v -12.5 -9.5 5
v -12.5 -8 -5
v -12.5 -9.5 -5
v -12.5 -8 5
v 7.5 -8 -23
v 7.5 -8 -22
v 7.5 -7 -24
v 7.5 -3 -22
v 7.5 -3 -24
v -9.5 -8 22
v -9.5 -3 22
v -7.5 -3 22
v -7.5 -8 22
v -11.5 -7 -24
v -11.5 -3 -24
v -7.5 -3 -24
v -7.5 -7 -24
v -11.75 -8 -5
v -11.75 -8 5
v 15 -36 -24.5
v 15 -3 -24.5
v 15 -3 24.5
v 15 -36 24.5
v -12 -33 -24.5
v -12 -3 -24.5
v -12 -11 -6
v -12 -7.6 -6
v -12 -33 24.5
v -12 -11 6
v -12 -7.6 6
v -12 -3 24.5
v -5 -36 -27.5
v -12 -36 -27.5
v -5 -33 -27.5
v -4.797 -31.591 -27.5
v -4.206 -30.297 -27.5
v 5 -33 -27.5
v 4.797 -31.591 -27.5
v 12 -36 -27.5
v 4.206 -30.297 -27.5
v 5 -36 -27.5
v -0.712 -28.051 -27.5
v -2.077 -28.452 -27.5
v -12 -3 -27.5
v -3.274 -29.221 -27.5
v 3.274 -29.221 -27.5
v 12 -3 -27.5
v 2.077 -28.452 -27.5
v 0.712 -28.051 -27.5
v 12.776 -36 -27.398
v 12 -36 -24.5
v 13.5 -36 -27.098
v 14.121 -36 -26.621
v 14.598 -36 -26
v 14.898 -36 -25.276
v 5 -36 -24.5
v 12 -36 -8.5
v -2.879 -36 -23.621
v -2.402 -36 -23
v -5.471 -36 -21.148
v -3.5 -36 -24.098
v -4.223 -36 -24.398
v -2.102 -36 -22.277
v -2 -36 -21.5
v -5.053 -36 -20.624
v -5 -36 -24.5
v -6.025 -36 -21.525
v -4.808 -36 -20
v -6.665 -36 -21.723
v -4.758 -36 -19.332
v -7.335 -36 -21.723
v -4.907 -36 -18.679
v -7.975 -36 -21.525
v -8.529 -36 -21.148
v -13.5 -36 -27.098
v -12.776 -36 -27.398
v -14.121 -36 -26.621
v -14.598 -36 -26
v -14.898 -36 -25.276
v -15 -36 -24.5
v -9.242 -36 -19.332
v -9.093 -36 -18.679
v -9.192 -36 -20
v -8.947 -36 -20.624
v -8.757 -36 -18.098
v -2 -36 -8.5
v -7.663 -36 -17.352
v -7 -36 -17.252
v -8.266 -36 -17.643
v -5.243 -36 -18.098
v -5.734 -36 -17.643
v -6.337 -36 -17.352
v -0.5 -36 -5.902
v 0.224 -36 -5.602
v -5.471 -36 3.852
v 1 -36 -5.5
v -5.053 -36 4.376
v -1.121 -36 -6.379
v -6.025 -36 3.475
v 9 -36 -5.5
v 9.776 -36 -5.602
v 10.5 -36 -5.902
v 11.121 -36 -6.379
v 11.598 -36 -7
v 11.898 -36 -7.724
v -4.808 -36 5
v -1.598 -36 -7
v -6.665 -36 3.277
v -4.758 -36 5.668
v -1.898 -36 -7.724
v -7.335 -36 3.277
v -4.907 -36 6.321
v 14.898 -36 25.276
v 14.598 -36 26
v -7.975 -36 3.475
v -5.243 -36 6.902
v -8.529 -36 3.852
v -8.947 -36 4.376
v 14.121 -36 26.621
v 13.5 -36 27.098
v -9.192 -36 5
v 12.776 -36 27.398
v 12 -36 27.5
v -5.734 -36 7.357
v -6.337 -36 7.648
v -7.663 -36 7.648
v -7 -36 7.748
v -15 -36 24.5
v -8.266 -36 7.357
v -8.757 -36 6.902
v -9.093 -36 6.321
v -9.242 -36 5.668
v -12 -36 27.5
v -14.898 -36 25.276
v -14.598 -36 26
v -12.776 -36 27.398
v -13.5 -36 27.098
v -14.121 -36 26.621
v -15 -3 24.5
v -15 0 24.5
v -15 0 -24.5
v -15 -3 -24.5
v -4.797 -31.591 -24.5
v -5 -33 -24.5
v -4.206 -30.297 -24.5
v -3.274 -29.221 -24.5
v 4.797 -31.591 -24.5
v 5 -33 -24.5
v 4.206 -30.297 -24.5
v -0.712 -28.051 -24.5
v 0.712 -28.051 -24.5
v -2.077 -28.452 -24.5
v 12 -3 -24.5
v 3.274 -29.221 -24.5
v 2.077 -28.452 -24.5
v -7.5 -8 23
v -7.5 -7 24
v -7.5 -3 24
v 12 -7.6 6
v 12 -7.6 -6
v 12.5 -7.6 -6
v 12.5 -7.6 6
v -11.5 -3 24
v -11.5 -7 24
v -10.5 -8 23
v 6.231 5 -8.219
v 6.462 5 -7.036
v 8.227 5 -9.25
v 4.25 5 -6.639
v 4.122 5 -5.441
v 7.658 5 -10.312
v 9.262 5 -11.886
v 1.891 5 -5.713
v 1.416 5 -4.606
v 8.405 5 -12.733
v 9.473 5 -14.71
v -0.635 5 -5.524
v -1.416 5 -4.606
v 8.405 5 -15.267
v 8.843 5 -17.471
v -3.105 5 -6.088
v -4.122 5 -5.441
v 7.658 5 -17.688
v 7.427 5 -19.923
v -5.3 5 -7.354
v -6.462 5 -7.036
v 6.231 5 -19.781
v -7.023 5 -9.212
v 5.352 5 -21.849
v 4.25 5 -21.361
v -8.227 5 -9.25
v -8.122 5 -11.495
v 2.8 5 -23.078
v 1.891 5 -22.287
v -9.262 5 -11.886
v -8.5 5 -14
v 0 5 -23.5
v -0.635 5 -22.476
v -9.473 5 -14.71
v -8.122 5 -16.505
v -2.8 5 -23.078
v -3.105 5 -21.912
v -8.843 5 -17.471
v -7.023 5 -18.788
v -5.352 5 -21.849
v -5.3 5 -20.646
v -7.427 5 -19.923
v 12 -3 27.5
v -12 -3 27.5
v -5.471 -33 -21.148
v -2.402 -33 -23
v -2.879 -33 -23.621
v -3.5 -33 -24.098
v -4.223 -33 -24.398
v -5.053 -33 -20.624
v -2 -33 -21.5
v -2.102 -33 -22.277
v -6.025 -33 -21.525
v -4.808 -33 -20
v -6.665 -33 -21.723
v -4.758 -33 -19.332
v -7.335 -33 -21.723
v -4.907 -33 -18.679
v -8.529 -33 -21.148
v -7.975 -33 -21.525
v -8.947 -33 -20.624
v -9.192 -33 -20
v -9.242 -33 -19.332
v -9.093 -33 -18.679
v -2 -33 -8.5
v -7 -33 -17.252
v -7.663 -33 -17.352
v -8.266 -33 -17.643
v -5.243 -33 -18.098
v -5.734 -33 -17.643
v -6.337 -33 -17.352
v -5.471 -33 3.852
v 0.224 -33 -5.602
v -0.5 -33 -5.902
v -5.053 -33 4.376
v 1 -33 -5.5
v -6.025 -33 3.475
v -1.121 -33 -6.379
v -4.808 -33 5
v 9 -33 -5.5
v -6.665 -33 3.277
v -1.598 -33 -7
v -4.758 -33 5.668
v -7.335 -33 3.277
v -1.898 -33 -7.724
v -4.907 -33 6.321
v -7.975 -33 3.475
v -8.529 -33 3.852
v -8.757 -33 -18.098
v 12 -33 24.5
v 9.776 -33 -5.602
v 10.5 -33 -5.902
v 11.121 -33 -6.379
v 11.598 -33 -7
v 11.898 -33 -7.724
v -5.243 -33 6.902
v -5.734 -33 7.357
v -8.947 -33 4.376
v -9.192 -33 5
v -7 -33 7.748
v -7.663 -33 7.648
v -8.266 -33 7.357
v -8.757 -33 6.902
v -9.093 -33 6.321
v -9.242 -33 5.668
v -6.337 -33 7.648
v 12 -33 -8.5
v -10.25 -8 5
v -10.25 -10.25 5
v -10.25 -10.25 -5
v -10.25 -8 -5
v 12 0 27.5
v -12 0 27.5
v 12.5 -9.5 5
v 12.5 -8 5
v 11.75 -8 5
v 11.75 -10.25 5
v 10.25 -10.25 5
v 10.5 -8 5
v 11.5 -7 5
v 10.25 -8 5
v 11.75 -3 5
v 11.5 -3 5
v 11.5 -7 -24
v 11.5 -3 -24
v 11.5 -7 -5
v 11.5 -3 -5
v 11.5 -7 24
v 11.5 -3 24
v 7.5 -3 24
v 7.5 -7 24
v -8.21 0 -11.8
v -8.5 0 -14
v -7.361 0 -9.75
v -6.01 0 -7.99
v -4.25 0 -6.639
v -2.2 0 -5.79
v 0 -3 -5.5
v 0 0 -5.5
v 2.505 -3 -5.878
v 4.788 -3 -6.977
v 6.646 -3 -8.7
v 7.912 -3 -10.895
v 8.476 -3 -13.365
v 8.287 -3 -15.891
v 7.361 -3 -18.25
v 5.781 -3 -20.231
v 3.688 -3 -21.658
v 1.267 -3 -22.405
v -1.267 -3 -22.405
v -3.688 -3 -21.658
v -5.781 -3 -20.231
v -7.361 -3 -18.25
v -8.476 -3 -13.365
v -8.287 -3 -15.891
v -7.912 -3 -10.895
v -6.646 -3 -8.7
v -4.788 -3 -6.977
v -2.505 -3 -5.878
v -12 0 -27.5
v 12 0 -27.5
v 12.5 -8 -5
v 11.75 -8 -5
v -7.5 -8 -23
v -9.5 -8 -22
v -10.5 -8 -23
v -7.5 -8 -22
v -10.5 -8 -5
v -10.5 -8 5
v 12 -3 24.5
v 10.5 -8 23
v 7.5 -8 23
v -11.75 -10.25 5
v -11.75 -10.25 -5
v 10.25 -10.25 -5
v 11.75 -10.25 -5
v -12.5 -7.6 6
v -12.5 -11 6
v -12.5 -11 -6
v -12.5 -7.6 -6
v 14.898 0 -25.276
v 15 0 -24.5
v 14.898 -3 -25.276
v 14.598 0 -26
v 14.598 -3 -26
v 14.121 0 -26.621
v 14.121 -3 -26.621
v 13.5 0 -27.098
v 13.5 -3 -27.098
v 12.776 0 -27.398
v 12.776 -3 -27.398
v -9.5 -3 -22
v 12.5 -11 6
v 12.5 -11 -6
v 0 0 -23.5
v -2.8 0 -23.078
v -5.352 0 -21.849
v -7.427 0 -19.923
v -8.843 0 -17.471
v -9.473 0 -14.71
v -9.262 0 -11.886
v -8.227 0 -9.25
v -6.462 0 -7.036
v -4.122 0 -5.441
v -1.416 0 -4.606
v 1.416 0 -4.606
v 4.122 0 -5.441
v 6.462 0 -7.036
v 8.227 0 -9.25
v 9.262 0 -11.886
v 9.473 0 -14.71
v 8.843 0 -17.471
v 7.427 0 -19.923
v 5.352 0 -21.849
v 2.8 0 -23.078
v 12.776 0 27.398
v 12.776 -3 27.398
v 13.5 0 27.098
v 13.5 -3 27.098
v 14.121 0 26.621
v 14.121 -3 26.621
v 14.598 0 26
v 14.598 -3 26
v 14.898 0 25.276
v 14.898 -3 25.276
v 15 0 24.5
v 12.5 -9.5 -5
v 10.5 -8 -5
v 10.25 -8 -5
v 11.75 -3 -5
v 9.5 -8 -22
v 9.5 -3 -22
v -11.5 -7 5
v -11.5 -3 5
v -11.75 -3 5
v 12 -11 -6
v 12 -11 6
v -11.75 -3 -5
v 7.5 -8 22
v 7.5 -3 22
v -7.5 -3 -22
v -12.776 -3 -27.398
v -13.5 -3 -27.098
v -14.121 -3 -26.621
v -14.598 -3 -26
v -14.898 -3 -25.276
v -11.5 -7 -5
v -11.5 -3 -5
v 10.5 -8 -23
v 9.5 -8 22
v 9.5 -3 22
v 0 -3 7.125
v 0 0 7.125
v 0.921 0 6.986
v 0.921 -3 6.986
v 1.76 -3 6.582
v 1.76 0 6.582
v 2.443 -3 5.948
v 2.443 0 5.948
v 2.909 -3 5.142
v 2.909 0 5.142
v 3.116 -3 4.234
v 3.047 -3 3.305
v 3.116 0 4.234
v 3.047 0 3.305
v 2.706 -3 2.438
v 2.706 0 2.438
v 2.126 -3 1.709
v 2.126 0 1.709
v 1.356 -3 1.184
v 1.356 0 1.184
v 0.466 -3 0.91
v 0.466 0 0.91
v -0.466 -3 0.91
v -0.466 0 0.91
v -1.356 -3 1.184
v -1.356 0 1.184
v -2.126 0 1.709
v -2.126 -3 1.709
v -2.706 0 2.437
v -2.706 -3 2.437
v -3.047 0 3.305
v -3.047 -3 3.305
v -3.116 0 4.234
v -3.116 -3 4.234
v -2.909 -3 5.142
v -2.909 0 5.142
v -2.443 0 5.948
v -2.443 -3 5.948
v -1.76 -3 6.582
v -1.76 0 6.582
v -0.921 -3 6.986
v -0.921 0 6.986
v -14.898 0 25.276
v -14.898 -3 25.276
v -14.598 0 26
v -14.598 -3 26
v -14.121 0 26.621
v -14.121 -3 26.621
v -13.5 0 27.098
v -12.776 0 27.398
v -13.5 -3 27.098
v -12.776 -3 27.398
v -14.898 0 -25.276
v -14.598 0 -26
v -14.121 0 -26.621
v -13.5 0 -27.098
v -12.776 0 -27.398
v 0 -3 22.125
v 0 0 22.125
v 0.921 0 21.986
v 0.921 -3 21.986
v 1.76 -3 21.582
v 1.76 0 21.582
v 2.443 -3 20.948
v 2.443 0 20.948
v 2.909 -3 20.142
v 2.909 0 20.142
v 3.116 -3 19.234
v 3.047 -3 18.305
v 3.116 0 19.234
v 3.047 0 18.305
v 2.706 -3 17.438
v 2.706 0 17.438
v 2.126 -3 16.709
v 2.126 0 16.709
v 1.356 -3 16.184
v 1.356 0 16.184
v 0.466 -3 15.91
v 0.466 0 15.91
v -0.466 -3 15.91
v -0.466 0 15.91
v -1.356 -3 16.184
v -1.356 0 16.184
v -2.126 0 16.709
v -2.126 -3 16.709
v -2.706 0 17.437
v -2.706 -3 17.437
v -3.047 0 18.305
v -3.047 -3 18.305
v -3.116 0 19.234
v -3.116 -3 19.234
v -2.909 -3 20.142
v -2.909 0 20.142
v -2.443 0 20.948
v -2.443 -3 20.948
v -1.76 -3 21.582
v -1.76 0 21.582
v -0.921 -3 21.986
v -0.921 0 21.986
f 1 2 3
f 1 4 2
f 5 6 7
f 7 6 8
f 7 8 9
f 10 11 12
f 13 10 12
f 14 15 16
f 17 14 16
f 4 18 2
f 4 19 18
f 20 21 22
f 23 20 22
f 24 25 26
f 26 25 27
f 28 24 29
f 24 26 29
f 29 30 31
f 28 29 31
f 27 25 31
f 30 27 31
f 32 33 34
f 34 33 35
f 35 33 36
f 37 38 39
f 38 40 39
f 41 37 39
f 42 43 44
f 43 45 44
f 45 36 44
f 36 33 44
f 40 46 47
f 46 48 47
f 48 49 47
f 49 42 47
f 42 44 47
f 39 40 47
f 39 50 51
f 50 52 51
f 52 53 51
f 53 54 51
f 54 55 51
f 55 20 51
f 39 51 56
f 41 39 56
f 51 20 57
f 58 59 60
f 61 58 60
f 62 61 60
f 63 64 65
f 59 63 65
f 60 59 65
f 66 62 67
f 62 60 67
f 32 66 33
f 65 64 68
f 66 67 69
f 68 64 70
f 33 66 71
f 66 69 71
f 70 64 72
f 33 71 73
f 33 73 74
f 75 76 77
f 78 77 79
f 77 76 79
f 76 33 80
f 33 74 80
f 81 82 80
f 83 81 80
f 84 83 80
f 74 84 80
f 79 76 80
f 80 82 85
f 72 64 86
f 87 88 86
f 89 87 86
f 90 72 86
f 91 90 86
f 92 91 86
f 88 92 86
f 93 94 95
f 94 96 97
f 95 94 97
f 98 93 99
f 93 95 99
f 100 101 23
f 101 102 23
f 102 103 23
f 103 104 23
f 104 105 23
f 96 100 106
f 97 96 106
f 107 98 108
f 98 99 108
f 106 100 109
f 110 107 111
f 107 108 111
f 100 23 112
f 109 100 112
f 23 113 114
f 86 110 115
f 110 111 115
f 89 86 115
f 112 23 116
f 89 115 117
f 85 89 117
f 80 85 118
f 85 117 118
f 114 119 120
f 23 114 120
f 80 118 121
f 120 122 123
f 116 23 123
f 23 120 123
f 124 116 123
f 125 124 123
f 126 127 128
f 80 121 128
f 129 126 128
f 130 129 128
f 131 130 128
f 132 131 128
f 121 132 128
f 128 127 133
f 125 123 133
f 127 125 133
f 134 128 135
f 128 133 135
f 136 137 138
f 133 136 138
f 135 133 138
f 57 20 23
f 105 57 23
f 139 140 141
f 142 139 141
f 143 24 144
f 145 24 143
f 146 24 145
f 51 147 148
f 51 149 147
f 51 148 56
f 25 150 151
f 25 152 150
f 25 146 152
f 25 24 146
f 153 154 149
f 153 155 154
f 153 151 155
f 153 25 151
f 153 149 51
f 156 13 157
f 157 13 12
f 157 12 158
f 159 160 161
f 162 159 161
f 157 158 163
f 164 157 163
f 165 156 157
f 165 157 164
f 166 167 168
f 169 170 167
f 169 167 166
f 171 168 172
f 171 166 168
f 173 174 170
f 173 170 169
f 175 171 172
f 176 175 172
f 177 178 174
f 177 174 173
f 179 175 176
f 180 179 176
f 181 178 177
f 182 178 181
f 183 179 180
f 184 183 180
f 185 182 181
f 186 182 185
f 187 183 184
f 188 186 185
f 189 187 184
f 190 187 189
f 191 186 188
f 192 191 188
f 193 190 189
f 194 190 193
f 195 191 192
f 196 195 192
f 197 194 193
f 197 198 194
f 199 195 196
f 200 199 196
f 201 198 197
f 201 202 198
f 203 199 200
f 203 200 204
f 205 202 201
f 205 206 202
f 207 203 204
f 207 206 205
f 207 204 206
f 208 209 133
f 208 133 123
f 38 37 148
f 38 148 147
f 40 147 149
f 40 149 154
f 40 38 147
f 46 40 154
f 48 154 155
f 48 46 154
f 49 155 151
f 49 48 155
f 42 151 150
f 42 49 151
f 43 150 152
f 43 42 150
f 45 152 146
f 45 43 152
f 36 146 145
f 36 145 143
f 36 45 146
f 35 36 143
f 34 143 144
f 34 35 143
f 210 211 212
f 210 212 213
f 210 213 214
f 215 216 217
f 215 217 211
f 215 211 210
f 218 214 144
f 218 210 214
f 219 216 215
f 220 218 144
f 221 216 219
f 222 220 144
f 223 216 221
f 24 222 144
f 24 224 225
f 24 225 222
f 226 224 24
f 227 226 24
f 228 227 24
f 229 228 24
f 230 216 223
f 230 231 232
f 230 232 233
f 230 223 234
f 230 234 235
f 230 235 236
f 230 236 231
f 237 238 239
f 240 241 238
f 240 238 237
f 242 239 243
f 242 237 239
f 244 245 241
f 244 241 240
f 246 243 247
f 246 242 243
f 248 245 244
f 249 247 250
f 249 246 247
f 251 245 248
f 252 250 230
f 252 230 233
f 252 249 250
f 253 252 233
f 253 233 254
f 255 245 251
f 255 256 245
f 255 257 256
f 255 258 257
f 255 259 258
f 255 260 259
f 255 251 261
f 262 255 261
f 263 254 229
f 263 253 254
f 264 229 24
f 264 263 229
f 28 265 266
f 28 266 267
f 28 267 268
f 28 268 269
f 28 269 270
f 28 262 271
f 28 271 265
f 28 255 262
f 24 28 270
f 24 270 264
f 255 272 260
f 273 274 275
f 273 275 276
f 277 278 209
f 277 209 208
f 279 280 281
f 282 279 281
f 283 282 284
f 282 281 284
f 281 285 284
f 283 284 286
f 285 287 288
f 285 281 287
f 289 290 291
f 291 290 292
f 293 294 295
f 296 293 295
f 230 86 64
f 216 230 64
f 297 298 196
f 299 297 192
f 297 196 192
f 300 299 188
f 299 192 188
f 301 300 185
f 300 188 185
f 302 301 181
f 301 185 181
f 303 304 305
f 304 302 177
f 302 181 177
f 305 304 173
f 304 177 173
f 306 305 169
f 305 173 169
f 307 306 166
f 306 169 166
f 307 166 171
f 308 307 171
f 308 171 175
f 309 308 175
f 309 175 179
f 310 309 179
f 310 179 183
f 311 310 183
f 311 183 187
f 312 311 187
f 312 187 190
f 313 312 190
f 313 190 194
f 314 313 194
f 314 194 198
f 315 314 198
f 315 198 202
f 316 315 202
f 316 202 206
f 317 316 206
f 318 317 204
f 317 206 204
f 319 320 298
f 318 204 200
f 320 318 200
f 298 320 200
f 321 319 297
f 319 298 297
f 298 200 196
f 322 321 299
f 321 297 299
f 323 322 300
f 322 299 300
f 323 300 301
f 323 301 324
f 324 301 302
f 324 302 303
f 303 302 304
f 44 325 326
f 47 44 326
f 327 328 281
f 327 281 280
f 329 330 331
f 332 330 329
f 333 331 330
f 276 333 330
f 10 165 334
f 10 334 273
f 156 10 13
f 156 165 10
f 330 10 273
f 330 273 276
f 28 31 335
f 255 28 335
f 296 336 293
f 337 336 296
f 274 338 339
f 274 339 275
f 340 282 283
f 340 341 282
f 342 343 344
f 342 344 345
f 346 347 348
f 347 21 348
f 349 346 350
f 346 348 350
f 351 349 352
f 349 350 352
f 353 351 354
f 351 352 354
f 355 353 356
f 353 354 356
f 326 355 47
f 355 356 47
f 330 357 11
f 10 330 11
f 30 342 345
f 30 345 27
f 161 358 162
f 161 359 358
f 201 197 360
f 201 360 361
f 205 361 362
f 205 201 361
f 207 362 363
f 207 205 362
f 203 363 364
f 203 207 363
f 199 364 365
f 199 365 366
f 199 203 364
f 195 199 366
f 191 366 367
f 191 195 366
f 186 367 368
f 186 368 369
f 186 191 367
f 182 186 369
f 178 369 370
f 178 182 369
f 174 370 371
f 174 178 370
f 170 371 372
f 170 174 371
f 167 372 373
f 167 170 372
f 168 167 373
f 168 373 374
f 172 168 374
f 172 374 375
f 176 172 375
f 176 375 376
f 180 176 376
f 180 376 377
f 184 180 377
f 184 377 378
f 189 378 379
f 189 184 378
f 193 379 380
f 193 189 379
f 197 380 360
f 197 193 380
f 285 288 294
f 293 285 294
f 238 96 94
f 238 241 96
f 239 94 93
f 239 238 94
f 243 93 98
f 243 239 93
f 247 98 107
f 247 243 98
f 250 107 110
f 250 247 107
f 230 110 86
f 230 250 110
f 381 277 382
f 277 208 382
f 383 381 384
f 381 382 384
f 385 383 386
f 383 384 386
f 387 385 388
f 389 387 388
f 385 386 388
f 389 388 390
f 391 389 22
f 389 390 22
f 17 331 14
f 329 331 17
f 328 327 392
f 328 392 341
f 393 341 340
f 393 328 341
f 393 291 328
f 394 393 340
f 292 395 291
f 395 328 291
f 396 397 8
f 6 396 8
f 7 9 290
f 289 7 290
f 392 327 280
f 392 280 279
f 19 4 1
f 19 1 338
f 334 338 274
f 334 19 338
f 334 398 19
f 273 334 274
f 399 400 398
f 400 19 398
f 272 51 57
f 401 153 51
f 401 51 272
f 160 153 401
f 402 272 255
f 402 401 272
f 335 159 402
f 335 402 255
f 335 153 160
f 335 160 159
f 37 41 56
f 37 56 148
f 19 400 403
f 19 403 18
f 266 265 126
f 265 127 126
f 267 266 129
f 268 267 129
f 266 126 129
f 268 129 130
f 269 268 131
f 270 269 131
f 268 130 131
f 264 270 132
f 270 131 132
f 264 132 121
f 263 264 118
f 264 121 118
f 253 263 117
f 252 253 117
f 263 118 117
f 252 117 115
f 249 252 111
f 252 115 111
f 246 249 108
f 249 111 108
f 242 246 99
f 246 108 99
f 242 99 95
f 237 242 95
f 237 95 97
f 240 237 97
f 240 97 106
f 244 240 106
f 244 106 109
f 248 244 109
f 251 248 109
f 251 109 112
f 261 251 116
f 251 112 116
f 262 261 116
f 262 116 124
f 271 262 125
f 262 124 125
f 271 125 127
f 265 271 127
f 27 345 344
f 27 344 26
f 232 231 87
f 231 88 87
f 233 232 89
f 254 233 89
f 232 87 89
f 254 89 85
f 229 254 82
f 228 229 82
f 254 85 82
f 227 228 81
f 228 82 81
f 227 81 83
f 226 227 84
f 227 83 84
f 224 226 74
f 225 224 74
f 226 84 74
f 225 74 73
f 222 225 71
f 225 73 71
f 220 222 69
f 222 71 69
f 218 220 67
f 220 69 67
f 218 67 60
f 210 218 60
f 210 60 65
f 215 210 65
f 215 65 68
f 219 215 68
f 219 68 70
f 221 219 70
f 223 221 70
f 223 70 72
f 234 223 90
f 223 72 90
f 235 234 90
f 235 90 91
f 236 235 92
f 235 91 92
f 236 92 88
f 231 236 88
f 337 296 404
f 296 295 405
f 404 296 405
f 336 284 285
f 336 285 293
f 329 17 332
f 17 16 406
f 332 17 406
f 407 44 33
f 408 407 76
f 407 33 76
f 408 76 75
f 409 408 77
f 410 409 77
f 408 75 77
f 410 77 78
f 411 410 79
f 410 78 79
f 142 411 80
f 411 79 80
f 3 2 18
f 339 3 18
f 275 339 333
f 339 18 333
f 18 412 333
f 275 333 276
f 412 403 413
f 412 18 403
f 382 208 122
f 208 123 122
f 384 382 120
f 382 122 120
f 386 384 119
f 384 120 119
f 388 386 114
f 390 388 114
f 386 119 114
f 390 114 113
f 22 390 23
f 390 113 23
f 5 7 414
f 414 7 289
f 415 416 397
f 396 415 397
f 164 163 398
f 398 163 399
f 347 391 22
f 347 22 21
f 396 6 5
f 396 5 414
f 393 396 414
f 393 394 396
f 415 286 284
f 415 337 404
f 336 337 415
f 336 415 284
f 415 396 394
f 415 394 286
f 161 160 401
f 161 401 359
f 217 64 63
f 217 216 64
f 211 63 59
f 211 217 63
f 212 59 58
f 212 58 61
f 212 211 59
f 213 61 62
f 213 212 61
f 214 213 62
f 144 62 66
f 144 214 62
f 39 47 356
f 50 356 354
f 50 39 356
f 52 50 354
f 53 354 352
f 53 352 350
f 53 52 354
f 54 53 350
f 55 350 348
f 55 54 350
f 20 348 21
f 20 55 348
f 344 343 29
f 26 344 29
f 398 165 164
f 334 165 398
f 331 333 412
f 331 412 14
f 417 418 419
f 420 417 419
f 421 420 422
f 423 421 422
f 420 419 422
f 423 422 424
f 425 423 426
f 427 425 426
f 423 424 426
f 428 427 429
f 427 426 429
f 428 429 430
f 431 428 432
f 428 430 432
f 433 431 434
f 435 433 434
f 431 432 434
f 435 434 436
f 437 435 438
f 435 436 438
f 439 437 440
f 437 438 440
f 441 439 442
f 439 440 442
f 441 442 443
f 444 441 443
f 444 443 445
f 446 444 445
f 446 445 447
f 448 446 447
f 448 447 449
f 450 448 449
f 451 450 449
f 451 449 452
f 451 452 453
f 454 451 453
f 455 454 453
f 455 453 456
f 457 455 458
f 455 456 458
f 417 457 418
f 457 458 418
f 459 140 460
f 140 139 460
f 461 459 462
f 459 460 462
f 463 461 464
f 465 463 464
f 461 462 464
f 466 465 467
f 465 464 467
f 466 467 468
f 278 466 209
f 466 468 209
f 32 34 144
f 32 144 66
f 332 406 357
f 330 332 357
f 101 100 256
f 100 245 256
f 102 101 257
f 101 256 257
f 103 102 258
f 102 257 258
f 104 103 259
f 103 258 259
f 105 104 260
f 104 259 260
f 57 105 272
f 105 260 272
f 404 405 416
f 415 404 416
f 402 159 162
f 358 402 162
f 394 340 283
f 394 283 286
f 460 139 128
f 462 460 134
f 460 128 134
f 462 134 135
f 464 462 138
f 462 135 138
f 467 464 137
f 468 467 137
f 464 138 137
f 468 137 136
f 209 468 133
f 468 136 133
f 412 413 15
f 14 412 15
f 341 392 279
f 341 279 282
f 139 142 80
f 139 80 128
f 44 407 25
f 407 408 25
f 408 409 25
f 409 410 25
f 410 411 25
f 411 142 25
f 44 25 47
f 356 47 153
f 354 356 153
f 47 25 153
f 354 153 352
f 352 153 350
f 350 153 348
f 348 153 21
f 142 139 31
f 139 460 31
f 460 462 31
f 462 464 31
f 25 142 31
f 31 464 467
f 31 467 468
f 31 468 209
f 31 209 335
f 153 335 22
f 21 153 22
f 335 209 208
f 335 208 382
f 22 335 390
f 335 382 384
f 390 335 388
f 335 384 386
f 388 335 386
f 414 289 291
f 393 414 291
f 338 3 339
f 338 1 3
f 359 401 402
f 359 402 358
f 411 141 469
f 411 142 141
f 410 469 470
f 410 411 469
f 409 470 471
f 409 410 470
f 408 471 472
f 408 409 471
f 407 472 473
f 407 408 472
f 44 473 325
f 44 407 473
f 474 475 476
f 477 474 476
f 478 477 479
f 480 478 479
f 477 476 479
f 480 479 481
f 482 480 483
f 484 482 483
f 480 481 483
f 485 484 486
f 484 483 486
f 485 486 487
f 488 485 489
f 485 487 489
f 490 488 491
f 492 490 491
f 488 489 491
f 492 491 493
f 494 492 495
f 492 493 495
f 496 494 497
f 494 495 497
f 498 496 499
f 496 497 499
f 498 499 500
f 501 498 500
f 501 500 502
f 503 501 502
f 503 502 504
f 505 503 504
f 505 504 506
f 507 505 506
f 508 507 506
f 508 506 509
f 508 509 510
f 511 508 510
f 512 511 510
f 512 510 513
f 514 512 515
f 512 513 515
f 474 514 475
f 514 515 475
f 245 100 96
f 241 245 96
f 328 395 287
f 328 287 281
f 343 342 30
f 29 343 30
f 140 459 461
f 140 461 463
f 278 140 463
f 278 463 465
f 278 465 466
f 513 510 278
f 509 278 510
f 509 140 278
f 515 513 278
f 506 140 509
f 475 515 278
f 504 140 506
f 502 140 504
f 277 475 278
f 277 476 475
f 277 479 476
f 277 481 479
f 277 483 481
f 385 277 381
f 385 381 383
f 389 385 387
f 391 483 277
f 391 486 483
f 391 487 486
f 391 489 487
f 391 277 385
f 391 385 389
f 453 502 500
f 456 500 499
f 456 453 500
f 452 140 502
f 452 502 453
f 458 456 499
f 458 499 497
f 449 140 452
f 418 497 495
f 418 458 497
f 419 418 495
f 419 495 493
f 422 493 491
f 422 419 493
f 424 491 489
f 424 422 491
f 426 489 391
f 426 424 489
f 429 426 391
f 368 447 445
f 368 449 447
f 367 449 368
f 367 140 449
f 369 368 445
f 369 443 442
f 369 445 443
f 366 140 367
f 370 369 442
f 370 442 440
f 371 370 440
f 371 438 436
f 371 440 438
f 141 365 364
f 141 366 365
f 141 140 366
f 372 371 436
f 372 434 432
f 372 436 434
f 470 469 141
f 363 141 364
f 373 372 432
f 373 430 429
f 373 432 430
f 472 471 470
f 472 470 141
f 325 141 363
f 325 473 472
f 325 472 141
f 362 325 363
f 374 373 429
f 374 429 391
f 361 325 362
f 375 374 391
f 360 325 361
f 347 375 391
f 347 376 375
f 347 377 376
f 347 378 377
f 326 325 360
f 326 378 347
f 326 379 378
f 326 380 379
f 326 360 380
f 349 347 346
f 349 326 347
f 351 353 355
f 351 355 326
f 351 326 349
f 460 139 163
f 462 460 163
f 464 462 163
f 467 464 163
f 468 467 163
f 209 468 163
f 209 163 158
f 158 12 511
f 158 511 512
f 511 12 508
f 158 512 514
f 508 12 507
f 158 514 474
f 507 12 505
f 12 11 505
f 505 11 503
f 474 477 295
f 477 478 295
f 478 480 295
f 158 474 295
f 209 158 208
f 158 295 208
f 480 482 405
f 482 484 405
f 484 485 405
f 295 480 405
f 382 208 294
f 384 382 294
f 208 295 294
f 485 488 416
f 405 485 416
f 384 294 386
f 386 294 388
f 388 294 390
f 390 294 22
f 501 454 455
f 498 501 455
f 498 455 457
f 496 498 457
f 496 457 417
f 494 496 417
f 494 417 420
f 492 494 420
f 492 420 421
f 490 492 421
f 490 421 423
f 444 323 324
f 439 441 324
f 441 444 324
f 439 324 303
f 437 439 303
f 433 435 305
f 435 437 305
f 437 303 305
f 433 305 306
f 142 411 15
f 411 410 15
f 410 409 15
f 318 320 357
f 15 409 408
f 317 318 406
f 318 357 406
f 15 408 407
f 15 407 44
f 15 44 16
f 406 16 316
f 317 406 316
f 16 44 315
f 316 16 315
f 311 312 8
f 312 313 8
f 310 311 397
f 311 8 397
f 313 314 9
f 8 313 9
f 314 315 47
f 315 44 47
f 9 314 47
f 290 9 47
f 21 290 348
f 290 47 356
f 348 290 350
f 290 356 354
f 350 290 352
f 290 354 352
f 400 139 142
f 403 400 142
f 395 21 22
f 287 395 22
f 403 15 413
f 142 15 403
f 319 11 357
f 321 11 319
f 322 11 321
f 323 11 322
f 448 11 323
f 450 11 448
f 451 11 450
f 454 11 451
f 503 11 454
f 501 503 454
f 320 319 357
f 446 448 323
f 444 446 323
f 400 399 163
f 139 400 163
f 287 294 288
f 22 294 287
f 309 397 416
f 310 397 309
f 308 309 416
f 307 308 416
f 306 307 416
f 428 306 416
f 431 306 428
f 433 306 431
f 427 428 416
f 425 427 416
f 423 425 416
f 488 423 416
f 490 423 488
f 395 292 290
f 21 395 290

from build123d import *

# Parameters (mm, degrees)
SKETCH1_W                      = 30
SKETCH1_H                      = 55
BOSS_EXTRUDE7_DEPTH            = 3
SKETCH14_W                     = 30
SKETCH14_H                     = 55
SKETCH14_W_2                   = 24
SKETCH14_H_2                   = 49
BOSS_EXTRUDE8_DEPTH            = 33
CUT_EXTRUDE1_DEPTH             = 3
BOSS_EXTRUDE12_DEPTH           = 3
SKETCH31_W                     = 2.2479
SKETCH31_H                     = 3
F_8_CLEARANCE_HOLE3_AT_2_COUNT = 2
F_8_CLEARANCE_HOLE3_AT_2_PITCH = 25
FILLET1_R                      = 3
FILLET2_R                      = 3
FILLET3_R                      = 3
BOSS_EXTRUDE13_DEPTH           = 5
SKETCH36_W                     = 0.75
SKETCH36_H                     = 3.4
CUT_EXTRUDE2_DEPTH             = 6
SKETCH37_R                     = 3.125
SKETCH37_R_2                   = 8.5
CUT_EXTRUDE3_DEPTH             = 3
BOSS_EXTRUDE14_START           = 5
SKETCH38_R                     = 9.5
SKETCH38_R_2                   = 8.5
BOSS_EXTRUDE14_DEPTH           = 5
BOSS_EXTRUDE15_DEPTH           = 5
CHAMFER1_SIZE                  = 1
BOSS_EXTRUDE16_DEPTH           = 3
FILLET4_R                      = 3


with BuildPart() as part:
    # Sketch1 → Boss-Extrude7 (new body)
    with BuildSketch(Plane(origin=(0, 0, 0), x_dir=(1, 0, 0), z_dir=(0, 1, 0))):
        Rectangle(SKETCH1_W, SKETCH1_H)
    extrude(amount=-BOSS_EXTRUDE7_DEPTH)

    # Fillet3
    fillet3_edges = [part.edges().sort_by_distance(p)[0] for p in [
        (15, -1.5, 27.5),
        (-15, -1.5, 27.5),
        (-15, -1.5, -27.5),
        (15, -1.5, -27.5),
    ]]
    fillet(fillet3_edges, radius=FILLET3_R)

    # Sketch35 → Boss-Extrude13 (add, symmetric)
    with BuildSketch(Plane.XY):
        Polygon((10.25, -3), (11.75, -3), (11.75, -8), (12.5, -8), (12.5, -9.5), (11.75, -10.25), (10.25, -10.25), align=None)
        Polygon((-12.5, -9.5), (-11.75, -10.25), (-10.25, -10.25), (-10.25, -3), (-11.75, -3), (-11.75, -8), (-12.5, -8), align=None)
    extrude(amount=BOSS_EXTRUDE13_DEPTH, both=True)

    # Sketch37 → Cut-Extrude3 (cut)
    with BuildSketch(Plane(origin=(0, 0, 0), x_dir=(1, 0, 0), z_dir=(0, 1, 0))):
        with Locations(Location((0, -4, 0), (0, 0, 270))):
            Circle(SKETCH37_R)
        with Locations(Location((0, -19, 0), (0, 0, 270))):
            Circle(SKETCH37_R)
        with Locations(Location((0, 14, 0), (0, 0, 270))):
            Circle(SKETCH37_R_2)
    extrude(amount=-CUT_EXTRUDE3_DEPTH, mode=Mode.SUBTRACT)

    # Sketch38 → Boss-Extrude14 (add)
    with BuildSketch(Plane(origin=(0, 0, 0), x_dir=(1, 0, 0), z_dir=(0, 1, 0)).offset(BOSS_EXTRUDE14_START)):
        with Locations(Location((0, 14, 0), (0, 0, 90))):
            Circle(SKETCH38_R)
        with Locations(Location((0, 14, 0), (0, 0, 180))):
            Circle(SKETCH38_R_2, mode=Mode.SUBTRACT)
    extrude(amount=-BOSS_EXTRUDE14_DEPTH)

    # Sketch39 → Boss-Extrude15 (add)
    with BuildSketch(Plane.XZ.offset(3)):
        Polygon((11.5, 24), (7.5, 24), (7.5, 22), (9.5, 22), (9.5, -22), (7.5, -22), (7.5, -24), (11.5, -24), align=None)
        Polygon((-11.5, 24), (-11.5, -24), (-7.5, -24), (-7.5, -22), (-9.5, -22), (-9.5, 22), (-7.5, 22), (-7.5, 24), align=None)
    extrude(amount=BOSS_EXTRUDE15_DEPTH)

    # Chamfer1
    chamfer1_edges = [part.edges().sort_by_distance(p)[0] for p in [
        (11.5, -8, 14.5),
        (9.5, -8, 24),
        (9.5, -8, -24),
        (11.5, -8, -14.5),
        (-11.5, -8, -14.5),
        (-9.5, -8, -24),
        (-9.5, -8, 24),
        (-11.5, -8, 14.5),
    ]]
    chamfer(chamfer1_edges, length=CHAMFER1_SIZE)


with BuildPart() as body_2:
    # Sketch14 → Boss-Extrude8 (new body)
    with BuildSketch(Plane.XZ.offset(3)):
        Rectangle(SKETCH14_W, SKETCH14_H)
        Rectangle(SKETCH14_W_2, SKETCH14_H_2, mode=Mode.SUBTRACT)
    extrude(amount=BOSS_EXTRUDE8_DEPTH)

    # Sketch17 → Cut-Extrude1 (cut)
    with BuildSketch(Plane(origin=(-12.5, 0, -27.5), x_dir=(-1, 0, 0), z_dir=(0, 0, -1))):
        with BuildLine():
            Line((-17.5, -36), (-17.5, -33))
            ThreePointArc((-17.5, -33), (-12.5, -28), (-7.5, -33))
            Line((-7.5, -33), (-7.5, -36))
            Line((-7.5, -36), (-17.5, -36))
        make_face()
    extrude(amount=-CUT_EXTRUDE1_DEPTH, mode=Mode.SUBTRACT)

    # Sketch29 → Boss-Extrude12 (add)
    with BuildSketch(Plane.XZ.offset(36)):
        with BuildLine():
            Line((-12, 10.5), (-7, 10.5))
            ThreePointArc((-7, 10.5), (-3.464466094, 9.035533906), (-2, 5.5))
            Line((-2, 5.5), (-2, -24.5))
            Line((-2, -24.5), (-12, -24.5))
            Line((-12, -24.5), (-12, 10.5))
        make_face()
    extrude(amount=-BOSS_EXTRUDE12_DEPTH)

    # Sketch31 → #8 Clearance Hole3 (revolve, cut)
    with BuildSketch(Plane(origin=(-7, -33, 5.5), x_dir=(0, 0, 1), z_dir=(1, 0, 0))):
        with Locations((1.12395, 1.5)):
            Rectangle(SKETCH31_W, SKETCH31_H)
    f_8_clearance_hole3 = revolve(axis=Axis((-7, -26.65, 5.5), (0, -1, 0)), mode=Mode.SUBTRACT)

    # #8 Clearance Hole3 at 2: #8 Clearance Hole3 ×2
    with Locations(*[(0, 0, -i * F_8_CLEARANCE_HOLE3_AT_2_PITCH) for i in range(1, F_8_CLEARANCE_HOLE3_AT_2_COUNT)]):
        add(f_8_clearance_hole3, mode=Mode.SUBTRACT)

    # Fillet1
    fillet1_edges = [body_2.edges().sort_by_distance(p)[0] for p in [
        (-2, -34.5, -24.5),
    ]]
    fillet(fillet1_edges, radius=FILLET1_R - 0.0001)  # a hair under: the kernel refuses the full size

    # Fillet2
    fillet2_edges = [body_2.edges().sort_by_distance(p)[0] for p in [
        (-15, -19.5, -27.5),
        (-15, -19.5, 27.5),
        (15, -19.5, 27.5),
        (15, -19.5, -27.5),
    ]]
    fillet(fillet2_edges, radius=FILLET2_R)

    # Sketch36 → Cut-Extrude2 (cut, symmetric)
    with BuildSketch(Plane.XY):
        with Locations((12.125, -9.3)):
            Rectangle(SKETCH36_W, SKETCH36_H)
        with Locations((-12.125, -9.3)):
            Rectangle(SKETCH36_W, SKETCH36_H)
    extrude(amount=CUT_EXTRUDE2_DEPTH, both=True, mode=Mode.SUBTRACT)

    # Sketch41 → Boss-Extrude16 (add)
    with BuildSketch(Plane.XZ.offset(36)):
        with BuildLine():
            Line((-2, -5.5), (-2, 5.5))
            ThreePointArc((-2, 5.5), (-3.464466094, 9.035533906), (-7, 10.5))
            Line((-7, 10.5), (-12, 10.5))
            Line((-12, 10.5), (-12, 24.5))
            Line((-12, 24.5), (12, 24.5))
            Line((12, 24.5), (12, -5.5))
            Line((12, -5.5), (-2, -5.5))
        make_face()
    extrude(amount=-BOSS_EXTRUDE16_DEPTH)

    # Fillet4
    fillet4_edges = [body_2.edges().sort_by_distance(p)[0] for p in [
        (-2, -34.5, -5.5),
        (12, -34.5, -5.5),
    ]]
    fillet(fillet4_edges, radius=FILLET4_R)


solid = Compound([part.part, body_2.part])
